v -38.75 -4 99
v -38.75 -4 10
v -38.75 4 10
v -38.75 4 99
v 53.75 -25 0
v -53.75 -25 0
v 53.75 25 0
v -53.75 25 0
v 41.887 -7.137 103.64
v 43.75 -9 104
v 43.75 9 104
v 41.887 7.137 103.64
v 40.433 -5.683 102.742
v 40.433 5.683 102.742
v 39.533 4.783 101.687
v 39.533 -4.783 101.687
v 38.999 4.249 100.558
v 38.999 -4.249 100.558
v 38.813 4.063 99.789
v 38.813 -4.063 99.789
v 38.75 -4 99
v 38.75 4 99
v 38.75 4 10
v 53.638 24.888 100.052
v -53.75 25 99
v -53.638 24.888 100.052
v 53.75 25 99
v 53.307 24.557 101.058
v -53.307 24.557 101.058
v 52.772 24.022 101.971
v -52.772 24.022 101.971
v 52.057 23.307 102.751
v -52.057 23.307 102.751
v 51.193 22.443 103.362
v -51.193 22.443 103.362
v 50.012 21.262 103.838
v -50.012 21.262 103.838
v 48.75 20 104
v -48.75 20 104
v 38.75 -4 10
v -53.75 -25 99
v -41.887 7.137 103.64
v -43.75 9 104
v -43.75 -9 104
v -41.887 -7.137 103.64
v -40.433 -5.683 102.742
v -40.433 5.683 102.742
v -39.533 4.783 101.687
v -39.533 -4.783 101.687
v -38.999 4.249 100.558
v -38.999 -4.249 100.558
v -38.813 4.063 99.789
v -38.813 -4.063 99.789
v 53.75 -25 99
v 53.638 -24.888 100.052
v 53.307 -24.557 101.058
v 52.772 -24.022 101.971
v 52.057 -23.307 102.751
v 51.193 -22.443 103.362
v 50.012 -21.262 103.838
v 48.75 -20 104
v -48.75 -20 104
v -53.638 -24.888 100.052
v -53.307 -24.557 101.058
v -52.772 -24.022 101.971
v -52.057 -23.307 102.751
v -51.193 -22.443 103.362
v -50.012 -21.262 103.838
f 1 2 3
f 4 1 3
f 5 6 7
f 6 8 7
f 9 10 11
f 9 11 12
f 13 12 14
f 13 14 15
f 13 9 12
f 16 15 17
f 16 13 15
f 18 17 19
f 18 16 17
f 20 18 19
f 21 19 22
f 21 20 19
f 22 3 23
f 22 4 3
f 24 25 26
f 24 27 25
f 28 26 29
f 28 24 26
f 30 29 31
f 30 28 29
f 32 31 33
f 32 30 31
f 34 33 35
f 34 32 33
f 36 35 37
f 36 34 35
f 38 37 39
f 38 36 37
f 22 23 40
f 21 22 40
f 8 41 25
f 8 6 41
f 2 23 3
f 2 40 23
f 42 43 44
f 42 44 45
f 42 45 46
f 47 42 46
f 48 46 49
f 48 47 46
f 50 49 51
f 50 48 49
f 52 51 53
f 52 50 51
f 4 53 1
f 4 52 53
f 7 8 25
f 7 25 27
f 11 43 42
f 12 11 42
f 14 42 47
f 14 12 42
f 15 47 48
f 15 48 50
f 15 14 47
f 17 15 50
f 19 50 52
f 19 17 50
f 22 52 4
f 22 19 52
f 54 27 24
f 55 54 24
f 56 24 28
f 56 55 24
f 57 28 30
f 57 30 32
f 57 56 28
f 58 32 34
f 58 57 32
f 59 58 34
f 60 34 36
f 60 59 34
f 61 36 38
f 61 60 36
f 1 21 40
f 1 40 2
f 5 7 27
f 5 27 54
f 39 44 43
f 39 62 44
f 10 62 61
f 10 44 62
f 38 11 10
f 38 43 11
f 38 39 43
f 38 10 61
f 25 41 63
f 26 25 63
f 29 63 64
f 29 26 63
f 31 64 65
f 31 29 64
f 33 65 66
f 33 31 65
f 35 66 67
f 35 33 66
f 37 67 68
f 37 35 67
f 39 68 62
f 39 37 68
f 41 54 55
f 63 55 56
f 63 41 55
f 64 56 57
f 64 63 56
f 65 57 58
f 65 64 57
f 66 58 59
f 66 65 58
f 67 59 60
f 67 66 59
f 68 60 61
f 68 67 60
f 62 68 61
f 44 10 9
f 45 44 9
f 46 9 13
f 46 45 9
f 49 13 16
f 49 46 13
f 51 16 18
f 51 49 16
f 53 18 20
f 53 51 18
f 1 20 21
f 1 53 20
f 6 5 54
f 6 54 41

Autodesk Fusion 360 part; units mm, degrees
sketch "Sketch1" plane through (0, 0, 0) normal (0, 0, 1) x (1, 0, 0)
  line L0 (53.75, -25) -> (-53.75, -25)
  line L1 (-53.75, -25) -> (-53.75, 25)
  line L2 (-53.75, 25) -> (53.75, 25)
  line L3 (53.75, 25) -> (53.75, -25)
  line L4 (53.75, -25) -> (-53.75, 25) construction
  line L5 (-53.75, -25) -> (53.75, 25) construction
  dimension "d4" = 107.5
  dimension "d5" = 50
extrude "Extrude1" add sketch "Sketch1" along normal blind 104
sketch "Sketch2" plane through (0, 0, 104) normal (0, 0, 1) x (-1, 0, 0)
  line L0 (-53.75, -25) -> (53.75, -25)
  line L1 (53.75, -25) -> (53.75, 25)
  line L2 (53.75, 25) -> (-53.75, 25)
  line L3 (-53.75, 25) -> (-53.75, -25)
  line L4 (-38.75, 4) -> (38.75, 4)
  line L5 (38.75, 4) -> (38.75, -4)
  line L6 (38.75, -4) -> (-38.75, -4)
  line L7 (-38.75, -4) -> (-38.75, 4)
  line L8 (-38.75, 4) -> (38.75, -4) construction
  line L9 (38.75, 4) -> (-38.75, -4) construction
  dimension "d8" = 77.5
  dimension "d9" = 8
extrude "Extrude2" cut sketch "Sketch2" against normal blind 94 contours L4 L5 L6 L7
fillet "Fillet1" radius 5 1 faces at (12.9167, -18, 104)
equation "bredde = 77.5 mm"
equation "høyde = 312 mm"
equation "tykkelse = 8 mm"
equation "d4 = bredde + 30 mm"
equation "d6 = høyde / 3"
equation "d8 = bredde"
equation "d9 = tykkelse"
equation "d10 = -høyde / 3 + 10 mm"
